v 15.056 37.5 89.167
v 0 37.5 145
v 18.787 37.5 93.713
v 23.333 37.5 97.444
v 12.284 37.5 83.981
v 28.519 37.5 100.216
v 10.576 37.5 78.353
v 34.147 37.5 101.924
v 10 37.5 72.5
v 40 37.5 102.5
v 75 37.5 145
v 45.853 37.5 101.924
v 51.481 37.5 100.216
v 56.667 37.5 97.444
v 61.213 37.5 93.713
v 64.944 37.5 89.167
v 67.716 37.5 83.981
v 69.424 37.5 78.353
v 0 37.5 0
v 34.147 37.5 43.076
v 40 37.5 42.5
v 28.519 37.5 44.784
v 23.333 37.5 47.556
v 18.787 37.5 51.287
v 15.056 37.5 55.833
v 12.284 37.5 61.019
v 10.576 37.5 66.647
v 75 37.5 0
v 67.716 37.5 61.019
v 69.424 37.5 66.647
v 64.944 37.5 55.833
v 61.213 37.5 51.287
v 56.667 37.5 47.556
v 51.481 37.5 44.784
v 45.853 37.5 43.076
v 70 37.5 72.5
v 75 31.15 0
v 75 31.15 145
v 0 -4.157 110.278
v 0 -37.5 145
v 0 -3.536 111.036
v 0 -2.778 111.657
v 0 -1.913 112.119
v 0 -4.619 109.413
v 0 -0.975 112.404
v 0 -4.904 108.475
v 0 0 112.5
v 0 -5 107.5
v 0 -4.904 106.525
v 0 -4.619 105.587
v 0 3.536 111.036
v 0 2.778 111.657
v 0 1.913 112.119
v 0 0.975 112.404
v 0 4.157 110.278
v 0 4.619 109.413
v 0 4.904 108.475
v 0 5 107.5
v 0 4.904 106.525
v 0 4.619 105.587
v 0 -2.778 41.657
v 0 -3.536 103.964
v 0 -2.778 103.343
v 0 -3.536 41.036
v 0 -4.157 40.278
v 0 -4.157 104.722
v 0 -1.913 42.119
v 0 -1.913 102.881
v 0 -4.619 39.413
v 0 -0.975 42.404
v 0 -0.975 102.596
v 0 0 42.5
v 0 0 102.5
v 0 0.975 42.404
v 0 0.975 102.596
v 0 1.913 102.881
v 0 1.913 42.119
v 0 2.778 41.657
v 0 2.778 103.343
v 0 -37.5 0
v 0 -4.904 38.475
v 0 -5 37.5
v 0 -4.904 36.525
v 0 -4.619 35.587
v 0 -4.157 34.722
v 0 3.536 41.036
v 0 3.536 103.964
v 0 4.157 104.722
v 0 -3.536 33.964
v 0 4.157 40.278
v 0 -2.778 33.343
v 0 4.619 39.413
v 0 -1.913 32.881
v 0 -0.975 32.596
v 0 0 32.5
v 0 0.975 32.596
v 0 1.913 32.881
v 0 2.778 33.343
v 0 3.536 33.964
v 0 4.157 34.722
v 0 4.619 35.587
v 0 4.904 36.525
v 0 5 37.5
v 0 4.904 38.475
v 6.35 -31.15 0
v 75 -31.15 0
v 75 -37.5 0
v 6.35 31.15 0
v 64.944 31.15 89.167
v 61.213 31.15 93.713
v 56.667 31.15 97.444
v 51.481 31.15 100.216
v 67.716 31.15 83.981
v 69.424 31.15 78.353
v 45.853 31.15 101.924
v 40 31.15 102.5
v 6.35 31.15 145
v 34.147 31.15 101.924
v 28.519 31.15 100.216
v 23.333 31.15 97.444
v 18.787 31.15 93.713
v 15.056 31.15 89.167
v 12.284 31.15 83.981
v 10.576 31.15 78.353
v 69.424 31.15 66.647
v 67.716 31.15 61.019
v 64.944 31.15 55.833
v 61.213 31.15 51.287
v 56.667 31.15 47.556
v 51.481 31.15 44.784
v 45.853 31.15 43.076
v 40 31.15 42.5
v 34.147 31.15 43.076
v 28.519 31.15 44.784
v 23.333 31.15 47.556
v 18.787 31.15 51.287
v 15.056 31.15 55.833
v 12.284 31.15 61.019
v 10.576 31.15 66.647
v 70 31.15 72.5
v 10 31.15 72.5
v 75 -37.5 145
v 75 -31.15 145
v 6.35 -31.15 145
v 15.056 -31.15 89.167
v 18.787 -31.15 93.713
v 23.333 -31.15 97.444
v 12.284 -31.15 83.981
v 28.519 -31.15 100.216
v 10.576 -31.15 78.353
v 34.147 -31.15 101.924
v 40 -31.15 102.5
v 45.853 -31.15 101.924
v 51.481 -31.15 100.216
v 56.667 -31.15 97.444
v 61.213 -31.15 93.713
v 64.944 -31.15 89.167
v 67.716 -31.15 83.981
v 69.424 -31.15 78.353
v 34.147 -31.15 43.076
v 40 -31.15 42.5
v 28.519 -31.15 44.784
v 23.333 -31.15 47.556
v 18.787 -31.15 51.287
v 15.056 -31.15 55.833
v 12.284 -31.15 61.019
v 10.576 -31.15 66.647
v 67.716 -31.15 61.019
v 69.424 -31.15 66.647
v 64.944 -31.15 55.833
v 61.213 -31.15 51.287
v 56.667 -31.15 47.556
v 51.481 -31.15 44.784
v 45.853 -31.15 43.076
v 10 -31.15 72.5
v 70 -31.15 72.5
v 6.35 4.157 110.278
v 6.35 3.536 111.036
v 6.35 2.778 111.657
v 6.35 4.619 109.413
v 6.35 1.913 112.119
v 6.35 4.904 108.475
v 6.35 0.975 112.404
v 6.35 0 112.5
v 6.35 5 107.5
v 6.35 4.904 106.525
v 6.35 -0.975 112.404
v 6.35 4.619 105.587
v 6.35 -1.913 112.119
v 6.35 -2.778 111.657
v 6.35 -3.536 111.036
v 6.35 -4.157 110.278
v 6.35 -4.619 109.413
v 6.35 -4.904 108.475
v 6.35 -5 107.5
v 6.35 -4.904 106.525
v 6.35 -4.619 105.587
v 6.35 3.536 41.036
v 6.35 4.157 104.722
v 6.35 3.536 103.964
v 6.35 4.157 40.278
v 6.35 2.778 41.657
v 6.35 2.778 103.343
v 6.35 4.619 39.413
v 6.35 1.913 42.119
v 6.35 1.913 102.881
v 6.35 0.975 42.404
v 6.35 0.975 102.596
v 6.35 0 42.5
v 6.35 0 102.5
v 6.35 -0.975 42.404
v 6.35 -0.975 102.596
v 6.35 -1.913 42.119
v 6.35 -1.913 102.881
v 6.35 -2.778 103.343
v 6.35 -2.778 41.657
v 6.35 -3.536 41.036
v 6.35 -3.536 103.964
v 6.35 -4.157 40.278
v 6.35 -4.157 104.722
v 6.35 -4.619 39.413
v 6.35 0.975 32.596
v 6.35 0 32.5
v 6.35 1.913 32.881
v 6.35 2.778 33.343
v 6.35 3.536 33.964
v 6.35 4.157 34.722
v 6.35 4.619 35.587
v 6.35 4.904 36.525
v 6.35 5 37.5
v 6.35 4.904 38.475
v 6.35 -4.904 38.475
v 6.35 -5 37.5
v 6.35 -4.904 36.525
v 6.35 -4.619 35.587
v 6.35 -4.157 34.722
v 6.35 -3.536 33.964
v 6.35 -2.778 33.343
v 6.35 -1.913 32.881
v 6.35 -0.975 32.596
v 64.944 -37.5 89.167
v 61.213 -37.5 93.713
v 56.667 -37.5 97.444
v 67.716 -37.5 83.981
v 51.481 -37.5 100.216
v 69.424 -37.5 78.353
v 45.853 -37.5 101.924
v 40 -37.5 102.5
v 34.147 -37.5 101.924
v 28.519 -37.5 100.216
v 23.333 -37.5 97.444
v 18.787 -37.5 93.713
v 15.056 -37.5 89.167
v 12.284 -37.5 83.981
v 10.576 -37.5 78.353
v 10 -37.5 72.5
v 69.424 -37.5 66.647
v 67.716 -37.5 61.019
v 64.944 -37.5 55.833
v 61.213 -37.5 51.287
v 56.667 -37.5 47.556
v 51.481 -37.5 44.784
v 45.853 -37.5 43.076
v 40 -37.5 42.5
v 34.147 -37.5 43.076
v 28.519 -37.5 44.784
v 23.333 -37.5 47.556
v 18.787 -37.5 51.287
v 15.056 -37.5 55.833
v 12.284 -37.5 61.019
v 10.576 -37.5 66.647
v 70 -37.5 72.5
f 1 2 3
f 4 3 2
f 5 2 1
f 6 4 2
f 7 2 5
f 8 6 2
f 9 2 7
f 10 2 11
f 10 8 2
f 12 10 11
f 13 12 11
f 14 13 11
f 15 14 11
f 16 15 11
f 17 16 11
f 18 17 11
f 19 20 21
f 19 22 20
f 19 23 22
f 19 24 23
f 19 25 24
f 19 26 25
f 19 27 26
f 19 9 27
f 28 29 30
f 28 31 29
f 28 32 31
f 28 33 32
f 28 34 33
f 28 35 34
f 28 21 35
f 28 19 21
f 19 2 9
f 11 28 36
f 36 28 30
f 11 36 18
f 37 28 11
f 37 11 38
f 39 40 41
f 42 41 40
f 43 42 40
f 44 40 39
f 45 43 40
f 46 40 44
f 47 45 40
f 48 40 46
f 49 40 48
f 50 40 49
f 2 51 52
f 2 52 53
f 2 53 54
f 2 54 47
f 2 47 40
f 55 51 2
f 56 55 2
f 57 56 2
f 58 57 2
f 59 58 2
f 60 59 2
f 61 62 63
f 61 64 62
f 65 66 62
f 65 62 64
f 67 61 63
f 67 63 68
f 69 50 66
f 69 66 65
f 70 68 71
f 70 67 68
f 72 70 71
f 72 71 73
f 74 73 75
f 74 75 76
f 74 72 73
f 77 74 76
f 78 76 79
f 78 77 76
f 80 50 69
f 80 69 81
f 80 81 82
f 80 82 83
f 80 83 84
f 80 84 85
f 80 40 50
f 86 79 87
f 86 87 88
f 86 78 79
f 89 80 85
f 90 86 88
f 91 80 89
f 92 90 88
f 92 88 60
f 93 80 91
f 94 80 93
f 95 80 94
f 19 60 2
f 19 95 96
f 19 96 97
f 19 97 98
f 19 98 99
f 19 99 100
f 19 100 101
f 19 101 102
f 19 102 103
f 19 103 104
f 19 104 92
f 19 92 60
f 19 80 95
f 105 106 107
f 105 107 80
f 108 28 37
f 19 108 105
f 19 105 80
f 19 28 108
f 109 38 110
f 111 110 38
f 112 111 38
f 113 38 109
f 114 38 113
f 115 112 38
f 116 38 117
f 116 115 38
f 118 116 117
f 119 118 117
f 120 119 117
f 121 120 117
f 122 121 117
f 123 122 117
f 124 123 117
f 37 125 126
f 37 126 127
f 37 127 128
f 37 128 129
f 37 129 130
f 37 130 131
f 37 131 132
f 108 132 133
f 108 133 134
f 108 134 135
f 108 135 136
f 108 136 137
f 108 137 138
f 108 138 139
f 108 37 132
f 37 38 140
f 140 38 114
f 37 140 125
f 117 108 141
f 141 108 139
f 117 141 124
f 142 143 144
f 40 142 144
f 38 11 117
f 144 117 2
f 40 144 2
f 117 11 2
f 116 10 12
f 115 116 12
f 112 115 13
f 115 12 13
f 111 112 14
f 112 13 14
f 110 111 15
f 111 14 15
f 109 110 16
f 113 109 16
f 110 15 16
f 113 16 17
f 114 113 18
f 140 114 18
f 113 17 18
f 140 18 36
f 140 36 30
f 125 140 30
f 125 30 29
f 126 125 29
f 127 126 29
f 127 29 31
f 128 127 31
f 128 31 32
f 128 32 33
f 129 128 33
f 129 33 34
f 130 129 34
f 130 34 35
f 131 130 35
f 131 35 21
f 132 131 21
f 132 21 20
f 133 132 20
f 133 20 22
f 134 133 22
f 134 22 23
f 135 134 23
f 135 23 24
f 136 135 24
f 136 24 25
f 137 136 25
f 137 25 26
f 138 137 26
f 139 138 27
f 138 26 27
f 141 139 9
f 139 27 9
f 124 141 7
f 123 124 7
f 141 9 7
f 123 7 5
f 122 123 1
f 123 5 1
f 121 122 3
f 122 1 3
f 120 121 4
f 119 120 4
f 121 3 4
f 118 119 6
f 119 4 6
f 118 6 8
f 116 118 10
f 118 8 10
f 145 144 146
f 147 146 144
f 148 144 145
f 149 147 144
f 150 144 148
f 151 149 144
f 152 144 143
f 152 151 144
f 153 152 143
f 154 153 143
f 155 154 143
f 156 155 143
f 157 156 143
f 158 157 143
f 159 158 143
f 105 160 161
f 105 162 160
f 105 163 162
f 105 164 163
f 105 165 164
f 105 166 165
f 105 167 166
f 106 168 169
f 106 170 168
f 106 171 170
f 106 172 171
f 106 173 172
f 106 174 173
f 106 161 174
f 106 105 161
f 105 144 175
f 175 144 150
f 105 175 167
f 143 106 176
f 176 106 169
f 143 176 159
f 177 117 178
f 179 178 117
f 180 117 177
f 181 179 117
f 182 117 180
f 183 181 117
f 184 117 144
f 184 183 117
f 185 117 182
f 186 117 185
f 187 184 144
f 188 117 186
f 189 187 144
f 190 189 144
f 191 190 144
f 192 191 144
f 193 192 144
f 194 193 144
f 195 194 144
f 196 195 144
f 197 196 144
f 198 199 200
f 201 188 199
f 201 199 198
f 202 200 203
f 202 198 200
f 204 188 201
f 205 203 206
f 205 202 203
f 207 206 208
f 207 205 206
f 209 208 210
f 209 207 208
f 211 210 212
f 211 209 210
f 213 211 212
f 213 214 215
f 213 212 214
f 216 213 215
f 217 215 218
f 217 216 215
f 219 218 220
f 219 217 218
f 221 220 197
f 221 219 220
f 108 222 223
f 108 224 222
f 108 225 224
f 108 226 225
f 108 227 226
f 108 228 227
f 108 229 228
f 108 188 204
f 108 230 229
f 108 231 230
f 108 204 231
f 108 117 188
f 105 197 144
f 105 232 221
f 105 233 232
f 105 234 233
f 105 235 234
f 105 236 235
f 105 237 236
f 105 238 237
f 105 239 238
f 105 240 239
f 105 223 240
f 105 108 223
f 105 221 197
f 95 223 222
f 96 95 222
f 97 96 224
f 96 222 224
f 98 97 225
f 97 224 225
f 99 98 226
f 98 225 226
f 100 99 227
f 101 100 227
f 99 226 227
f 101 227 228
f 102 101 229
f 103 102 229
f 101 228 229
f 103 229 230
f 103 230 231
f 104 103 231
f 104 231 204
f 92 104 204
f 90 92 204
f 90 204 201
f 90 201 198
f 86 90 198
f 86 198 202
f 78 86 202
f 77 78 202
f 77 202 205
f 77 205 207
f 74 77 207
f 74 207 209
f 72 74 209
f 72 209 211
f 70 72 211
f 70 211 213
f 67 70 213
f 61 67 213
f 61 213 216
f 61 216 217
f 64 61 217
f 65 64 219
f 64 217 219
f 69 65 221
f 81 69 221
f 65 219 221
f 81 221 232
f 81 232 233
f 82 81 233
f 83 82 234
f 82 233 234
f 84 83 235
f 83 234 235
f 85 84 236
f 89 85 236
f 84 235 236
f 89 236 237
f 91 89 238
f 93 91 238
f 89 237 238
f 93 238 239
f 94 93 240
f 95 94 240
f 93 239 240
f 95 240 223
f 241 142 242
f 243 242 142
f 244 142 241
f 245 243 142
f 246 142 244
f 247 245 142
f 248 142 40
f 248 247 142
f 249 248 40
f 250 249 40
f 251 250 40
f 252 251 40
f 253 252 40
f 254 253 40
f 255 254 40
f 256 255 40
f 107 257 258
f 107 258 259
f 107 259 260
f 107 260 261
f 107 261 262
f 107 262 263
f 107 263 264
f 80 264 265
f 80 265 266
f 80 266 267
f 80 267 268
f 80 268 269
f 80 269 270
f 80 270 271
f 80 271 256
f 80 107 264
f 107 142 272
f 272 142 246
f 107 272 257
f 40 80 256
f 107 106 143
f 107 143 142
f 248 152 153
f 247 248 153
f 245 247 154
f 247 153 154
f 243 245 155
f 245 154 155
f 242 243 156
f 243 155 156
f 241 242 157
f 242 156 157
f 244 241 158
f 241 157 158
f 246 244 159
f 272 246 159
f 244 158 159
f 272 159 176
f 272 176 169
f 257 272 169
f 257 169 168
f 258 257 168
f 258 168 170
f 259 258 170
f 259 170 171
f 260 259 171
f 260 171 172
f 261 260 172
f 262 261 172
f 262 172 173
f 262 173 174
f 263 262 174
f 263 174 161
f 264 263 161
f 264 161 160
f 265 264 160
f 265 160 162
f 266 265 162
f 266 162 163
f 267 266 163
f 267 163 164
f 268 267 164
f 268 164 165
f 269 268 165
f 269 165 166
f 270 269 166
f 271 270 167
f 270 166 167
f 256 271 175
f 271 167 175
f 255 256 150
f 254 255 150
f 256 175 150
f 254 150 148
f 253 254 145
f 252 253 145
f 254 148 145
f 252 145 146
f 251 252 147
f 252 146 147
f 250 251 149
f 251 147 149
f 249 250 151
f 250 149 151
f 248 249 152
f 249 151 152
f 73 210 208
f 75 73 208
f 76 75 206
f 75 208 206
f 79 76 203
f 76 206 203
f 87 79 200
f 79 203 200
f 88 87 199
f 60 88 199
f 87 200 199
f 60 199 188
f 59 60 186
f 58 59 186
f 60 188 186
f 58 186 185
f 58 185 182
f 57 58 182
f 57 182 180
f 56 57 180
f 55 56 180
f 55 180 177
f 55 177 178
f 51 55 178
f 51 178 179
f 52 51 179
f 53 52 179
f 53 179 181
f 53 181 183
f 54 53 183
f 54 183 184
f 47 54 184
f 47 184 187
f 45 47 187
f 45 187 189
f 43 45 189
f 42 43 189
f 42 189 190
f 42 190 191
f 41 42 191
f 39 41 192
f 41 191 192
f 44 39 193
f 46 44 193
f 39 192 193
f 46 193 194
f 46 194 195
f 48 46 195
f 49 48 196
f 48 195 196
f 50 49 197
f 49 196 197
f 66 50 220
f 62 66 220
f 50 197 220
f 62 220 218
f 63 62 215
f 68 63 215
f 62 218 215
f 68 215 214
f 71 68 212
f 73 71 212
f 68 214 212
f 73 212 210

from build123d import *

# Parameters (mm, degrees)
BOSS_EXTRUDE1_DEPTH = 145
SKETCH2_R           = 30
CUT_EXTRUDE1_DEPTH  = 180.652442232
SKETCH3_R           = 5
CUT_EXTRUDE2_DEPTH  = 10


with BuildPart() as part:
    # Sketch1 → Boss-Extrude1 (new body)
    with BuildSketch(Plane.XY):
        Polygon((0, -37.5), (0, 37.5), (75, 37.5), (75, 31.15), (6.35, 31.15), (6.35, -31.15), (75, -31.15), (75, -37.5), align=None)
    extrude(amount=BOSS_EXTRUDE1_DEPTH)

    # Sketch2 → Cut-Extrude1 (cut, through all)
    with BuildSketch(Plane(origin=(0, 37.5, 0), x_dir=(1, 0, 0), z_dir=(0, 1, 0))):
        with Locations(Location((40, -72.5, 0), (0, 0, 270))):
            Circle(SKETCH2_R)
    extrude(amount=-CUT_EXTRUDE1_DEPTH, mode=Mode.SUBTRACT)

    # Sketch3 → Cut-Extrude2 (cut)
    with BuildSketch(Plane(origin=(6.35, 0, 0), x_dir=(0, 0, -1), z_dir=(1, 0, 0))):
        with Locations((-107.5, 0)):
            Circle(SKETCH3_R)
        with Locations((-37.5, 0)):
            Circle(SKETCH3_R)
    extrude(amount=-CUT_EXTRUDE2_DEPTH, mode=Mode.SUBTRACT)


solid = part.part
